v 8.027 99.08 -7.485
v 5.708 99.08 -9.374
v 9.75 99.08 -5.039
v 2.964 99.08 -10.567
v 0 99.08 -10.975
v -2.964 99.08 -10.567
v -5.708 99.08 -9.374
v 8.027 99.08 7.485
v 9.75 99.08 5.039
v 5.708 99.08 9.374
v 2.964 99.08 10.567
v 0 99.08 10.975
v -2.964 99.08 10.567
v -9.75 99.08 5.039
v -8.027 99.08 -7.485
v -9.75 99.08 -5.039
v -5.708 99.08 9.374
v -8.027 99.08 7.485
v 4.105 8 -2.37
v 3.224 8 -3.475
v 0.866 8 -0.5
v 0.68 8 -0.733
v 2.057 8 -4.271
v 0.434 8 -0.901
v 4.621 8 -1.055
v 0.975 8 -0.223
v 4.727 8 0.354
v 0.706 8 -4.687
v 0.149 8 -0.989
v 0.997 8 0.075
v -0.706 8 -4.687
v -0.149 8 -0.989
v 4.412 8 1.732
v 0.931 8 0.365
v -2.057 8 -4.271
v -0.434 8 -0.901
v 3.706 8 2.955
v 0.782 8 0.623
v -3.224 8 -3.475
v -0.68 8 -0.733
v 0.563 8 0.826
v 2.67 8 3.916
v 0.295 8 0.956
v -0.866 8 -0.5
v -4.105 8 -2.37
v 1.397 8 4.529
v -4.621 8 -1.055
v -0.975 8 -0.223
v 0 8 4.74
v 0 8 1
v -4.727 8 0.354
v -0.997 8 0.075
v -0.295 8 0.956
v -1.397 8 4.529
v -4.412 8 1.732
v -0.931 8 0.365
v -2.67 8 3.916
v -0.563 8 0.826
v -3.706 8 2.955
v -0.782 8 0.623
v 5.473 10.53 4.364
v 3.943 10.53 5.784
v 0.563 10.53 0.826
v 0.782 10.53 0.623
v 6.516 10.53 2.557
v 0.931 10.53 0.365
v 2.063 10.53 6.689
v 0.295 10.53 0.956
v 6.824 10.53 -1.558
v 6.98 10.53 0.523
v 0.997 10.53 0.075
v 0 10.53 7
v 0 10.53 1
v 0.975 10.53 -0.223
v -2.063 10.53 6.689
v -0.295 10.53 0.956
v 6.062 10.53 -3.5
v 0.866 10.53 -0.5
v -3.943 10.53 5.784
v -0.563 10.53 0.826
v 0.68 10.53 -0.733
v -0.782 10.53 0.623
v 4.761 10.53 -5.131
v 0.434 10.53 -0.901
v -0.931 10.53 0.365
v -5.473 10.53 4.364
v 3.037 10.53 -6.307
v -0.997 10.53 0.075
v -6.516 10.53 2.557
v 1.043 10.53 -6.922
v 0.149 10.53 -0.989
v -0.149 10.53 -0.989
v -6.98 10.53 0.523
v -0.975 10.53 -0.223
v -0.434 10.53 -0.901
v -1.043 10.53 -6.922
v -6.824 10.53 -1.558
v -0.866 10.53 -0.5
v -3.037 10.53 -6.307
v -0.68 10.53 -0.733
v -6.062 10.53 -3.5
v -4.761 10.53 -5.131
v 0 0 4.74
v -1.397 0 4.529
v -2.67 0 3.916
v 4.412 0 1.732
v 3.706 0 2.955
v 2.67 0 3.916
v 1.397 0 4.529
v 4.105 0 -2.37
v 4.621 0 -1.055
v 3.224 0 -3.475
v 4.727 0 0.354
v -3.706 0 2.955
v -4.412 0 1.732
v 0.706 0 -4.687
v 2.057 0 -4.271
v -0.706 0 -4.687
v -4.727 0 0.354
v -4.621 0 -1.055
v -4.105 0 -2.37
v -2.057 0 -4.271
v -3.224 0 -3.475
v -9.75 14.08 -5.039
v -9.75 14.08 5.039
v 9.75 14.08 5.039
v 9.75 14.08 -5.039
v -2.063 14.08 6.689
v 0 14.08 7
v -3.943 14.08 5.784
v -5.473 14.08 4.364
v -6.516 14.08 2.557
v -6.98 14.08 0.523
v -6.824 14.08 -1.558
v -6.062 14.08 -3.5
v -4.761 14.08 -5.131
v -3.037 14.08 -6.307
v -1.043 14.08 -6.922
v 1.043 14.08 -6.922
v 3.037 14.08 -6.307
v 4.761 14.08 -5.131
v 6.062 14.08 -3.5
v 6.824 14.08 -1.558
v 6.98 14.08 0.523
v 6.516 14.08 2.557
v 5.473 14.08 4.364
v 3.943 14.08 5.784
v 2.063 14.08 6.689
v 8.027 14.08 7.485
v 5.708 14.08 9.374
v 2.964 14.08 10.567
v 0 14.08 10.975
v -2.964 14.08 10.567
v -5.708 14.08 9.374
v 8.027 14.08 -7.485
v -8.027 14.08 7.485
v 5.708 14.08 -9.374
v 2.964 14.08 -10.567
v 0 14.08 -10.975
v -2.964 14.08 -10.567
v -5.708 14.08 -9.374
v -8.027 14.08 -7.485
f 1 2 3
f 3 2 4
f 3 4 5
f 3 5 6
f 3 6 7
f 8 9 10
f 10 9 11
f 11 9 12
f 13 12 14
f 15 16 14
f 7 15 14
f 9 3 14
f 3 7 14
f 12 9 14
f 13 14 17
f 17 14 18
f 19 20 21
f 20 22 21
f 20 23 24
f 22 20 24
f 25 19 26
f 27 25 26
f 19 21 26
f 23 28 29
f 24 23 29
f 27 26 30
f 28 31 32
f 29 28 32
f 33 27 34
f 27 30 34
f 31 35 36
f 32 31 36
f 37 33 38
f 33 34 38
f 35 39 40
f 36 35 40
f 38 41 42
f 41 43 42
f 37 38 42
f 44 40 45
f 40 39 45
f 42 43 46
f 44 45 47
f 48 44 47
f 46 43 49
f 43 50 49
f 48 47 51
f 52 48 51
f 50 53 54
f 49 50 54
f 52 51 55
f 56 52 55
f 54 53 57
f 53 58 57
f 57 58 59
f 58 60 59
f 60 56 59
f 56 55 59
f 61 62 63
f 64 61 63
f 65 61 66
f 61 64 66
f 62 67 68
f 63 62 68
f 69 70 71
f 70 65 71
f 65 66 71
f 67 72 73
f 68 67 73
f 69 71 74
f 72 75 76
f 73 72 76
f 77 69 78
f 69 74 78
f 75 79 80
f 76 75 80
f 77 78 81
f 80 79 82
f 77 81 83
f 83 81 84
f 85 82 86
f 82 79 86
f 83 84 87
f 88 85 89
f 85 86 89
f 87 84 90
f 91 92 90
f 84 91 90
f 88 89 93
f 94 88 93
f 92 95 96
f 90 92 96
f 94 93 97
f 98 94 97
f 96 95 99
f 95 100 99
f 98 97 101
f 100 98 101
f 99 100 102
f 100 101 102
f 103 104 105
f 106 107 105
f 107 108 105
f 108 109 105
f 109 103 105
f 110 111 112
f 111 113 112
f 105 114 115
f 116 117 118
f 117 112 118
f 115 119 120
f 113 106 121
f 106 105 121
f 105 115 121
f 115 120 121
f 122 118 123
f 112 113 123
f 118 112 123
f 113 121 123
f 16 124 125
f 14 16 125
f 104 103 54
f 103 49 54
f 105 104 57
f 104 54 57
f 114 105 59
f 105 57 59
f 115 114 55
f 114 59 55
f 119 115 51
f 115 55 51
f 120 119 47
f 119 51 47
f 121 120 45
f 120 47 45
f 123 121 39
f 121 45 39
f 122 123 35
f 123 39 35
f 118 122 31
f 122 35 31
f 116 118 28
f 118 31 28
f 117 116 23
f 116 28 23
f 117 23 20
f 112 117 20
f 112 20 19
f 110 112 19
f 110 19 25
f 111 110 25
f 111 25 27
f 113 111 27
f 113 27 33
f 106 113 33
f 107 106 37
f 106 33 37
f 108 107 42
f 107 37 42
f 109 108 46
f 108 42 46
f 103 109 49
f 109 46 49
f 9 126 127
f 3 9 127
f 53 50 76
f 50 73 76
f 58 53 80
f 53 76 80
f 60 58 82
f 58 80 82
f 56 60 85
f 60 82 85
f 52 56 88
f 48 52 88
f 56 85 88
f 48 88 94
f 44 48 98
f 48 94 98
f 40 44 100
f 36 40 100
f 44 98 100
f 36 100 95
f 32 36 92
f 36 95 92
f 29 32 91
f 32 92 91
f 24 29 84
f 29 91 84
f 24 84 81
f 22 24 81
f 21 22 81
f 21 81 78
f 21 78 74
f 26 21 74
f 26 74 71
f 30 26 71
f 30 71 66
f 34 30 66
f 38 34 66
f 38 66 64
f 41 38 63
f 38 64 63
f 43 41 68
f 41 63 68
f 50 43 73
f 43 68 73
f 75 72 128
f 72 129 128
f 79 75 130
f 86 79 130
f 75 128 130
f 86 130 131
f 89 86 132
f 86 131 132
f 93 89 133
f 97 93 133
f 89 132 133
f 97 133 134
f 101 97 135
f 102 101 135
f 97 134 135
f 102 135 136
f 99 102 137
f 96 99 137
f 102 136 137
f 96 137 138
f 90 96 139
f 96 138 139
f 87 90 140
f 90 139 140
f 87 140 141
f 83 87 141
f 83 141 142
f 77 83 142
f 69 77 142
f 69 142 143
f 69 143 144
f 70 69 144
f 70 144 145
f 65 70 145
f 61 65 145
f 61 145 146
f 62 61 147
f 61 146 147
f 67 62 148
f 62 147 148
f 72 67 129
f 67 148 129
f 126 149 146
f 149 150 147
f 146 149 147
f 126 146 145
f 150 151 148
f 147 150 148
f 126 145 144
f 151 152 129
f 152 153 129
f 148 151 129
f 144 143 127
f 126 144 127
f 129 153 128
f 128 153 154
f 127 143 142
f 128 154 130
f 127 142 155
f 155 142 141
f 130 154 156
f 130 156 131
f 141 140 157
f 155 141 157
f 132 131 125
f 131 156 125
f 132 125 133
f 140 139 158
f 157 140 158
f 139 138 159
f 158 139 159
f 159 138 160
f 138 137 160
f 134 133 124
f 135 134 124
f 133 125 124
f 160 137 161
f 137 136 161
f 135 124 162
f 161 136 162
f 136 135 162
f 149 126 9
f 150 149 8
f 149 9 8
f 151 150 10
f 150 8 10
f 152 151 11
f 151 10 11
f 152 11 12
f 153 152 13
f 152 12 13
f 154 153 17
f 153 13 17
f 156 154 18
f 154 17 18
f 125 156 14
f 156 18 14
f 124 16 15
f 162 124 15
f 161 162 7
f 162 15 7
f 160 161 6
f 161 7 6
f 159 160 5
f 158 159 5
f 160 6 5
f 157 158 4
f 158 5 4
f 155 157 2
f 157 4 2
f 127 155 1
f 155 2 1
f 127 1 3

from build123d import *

# Parameters (mm, degrees)
CUT_EXTRUDE1_DEPTH = 101.2883226


with BuildPart() as part:
    # Sketch1 → Revolve1 (revolve)
    with BuildSketch(Plane.XY, mode=Mode.PRIVATE) as revolve1_sk:
        Polygon((0, 0), (4.74, 0), (4.74, 8), (1, 8), (1, 10.53), (7, 10.53), (7, 14.08), (10.975, 14.08), (10.975, 99.08), (0, 99.08), align=None)
    revolve(revolve1_sk.sketch.rotate(Axis((0, 72.454564891, 0), (0, -1, 0)), 90), axis=Axis((0, 72.454564891, 0), (0, -1, 0)))

    # Sketch2 → Cut-Extrude1 (cut, through all)
    with BuildSketch(Plane(origin=(0, 99.08, 0), x_dir=(1, 0, 0), z_dir=(0, 1, 0))):
        with BuildLine():
            Line((-9.75, 5.038663017), (-9.75, -5.038663017))
            ThreePointArc((-9.75, -5.038663017), (-10.975, 0), (-9.75, 5.038663017))
        make_face()
        with BuildLine():
            Line((9.75, -5.038663017), (9.75, 5.038663017))
            ThreePointArc((9.75, 5.038663017), (10.975, 0), (9.75, -5.038663017))
        make_face()
    extrude(amount=-CUT_EXTRUDE1_DEPTH, mode=Mode.SUBTRACT)


solid = part.part
